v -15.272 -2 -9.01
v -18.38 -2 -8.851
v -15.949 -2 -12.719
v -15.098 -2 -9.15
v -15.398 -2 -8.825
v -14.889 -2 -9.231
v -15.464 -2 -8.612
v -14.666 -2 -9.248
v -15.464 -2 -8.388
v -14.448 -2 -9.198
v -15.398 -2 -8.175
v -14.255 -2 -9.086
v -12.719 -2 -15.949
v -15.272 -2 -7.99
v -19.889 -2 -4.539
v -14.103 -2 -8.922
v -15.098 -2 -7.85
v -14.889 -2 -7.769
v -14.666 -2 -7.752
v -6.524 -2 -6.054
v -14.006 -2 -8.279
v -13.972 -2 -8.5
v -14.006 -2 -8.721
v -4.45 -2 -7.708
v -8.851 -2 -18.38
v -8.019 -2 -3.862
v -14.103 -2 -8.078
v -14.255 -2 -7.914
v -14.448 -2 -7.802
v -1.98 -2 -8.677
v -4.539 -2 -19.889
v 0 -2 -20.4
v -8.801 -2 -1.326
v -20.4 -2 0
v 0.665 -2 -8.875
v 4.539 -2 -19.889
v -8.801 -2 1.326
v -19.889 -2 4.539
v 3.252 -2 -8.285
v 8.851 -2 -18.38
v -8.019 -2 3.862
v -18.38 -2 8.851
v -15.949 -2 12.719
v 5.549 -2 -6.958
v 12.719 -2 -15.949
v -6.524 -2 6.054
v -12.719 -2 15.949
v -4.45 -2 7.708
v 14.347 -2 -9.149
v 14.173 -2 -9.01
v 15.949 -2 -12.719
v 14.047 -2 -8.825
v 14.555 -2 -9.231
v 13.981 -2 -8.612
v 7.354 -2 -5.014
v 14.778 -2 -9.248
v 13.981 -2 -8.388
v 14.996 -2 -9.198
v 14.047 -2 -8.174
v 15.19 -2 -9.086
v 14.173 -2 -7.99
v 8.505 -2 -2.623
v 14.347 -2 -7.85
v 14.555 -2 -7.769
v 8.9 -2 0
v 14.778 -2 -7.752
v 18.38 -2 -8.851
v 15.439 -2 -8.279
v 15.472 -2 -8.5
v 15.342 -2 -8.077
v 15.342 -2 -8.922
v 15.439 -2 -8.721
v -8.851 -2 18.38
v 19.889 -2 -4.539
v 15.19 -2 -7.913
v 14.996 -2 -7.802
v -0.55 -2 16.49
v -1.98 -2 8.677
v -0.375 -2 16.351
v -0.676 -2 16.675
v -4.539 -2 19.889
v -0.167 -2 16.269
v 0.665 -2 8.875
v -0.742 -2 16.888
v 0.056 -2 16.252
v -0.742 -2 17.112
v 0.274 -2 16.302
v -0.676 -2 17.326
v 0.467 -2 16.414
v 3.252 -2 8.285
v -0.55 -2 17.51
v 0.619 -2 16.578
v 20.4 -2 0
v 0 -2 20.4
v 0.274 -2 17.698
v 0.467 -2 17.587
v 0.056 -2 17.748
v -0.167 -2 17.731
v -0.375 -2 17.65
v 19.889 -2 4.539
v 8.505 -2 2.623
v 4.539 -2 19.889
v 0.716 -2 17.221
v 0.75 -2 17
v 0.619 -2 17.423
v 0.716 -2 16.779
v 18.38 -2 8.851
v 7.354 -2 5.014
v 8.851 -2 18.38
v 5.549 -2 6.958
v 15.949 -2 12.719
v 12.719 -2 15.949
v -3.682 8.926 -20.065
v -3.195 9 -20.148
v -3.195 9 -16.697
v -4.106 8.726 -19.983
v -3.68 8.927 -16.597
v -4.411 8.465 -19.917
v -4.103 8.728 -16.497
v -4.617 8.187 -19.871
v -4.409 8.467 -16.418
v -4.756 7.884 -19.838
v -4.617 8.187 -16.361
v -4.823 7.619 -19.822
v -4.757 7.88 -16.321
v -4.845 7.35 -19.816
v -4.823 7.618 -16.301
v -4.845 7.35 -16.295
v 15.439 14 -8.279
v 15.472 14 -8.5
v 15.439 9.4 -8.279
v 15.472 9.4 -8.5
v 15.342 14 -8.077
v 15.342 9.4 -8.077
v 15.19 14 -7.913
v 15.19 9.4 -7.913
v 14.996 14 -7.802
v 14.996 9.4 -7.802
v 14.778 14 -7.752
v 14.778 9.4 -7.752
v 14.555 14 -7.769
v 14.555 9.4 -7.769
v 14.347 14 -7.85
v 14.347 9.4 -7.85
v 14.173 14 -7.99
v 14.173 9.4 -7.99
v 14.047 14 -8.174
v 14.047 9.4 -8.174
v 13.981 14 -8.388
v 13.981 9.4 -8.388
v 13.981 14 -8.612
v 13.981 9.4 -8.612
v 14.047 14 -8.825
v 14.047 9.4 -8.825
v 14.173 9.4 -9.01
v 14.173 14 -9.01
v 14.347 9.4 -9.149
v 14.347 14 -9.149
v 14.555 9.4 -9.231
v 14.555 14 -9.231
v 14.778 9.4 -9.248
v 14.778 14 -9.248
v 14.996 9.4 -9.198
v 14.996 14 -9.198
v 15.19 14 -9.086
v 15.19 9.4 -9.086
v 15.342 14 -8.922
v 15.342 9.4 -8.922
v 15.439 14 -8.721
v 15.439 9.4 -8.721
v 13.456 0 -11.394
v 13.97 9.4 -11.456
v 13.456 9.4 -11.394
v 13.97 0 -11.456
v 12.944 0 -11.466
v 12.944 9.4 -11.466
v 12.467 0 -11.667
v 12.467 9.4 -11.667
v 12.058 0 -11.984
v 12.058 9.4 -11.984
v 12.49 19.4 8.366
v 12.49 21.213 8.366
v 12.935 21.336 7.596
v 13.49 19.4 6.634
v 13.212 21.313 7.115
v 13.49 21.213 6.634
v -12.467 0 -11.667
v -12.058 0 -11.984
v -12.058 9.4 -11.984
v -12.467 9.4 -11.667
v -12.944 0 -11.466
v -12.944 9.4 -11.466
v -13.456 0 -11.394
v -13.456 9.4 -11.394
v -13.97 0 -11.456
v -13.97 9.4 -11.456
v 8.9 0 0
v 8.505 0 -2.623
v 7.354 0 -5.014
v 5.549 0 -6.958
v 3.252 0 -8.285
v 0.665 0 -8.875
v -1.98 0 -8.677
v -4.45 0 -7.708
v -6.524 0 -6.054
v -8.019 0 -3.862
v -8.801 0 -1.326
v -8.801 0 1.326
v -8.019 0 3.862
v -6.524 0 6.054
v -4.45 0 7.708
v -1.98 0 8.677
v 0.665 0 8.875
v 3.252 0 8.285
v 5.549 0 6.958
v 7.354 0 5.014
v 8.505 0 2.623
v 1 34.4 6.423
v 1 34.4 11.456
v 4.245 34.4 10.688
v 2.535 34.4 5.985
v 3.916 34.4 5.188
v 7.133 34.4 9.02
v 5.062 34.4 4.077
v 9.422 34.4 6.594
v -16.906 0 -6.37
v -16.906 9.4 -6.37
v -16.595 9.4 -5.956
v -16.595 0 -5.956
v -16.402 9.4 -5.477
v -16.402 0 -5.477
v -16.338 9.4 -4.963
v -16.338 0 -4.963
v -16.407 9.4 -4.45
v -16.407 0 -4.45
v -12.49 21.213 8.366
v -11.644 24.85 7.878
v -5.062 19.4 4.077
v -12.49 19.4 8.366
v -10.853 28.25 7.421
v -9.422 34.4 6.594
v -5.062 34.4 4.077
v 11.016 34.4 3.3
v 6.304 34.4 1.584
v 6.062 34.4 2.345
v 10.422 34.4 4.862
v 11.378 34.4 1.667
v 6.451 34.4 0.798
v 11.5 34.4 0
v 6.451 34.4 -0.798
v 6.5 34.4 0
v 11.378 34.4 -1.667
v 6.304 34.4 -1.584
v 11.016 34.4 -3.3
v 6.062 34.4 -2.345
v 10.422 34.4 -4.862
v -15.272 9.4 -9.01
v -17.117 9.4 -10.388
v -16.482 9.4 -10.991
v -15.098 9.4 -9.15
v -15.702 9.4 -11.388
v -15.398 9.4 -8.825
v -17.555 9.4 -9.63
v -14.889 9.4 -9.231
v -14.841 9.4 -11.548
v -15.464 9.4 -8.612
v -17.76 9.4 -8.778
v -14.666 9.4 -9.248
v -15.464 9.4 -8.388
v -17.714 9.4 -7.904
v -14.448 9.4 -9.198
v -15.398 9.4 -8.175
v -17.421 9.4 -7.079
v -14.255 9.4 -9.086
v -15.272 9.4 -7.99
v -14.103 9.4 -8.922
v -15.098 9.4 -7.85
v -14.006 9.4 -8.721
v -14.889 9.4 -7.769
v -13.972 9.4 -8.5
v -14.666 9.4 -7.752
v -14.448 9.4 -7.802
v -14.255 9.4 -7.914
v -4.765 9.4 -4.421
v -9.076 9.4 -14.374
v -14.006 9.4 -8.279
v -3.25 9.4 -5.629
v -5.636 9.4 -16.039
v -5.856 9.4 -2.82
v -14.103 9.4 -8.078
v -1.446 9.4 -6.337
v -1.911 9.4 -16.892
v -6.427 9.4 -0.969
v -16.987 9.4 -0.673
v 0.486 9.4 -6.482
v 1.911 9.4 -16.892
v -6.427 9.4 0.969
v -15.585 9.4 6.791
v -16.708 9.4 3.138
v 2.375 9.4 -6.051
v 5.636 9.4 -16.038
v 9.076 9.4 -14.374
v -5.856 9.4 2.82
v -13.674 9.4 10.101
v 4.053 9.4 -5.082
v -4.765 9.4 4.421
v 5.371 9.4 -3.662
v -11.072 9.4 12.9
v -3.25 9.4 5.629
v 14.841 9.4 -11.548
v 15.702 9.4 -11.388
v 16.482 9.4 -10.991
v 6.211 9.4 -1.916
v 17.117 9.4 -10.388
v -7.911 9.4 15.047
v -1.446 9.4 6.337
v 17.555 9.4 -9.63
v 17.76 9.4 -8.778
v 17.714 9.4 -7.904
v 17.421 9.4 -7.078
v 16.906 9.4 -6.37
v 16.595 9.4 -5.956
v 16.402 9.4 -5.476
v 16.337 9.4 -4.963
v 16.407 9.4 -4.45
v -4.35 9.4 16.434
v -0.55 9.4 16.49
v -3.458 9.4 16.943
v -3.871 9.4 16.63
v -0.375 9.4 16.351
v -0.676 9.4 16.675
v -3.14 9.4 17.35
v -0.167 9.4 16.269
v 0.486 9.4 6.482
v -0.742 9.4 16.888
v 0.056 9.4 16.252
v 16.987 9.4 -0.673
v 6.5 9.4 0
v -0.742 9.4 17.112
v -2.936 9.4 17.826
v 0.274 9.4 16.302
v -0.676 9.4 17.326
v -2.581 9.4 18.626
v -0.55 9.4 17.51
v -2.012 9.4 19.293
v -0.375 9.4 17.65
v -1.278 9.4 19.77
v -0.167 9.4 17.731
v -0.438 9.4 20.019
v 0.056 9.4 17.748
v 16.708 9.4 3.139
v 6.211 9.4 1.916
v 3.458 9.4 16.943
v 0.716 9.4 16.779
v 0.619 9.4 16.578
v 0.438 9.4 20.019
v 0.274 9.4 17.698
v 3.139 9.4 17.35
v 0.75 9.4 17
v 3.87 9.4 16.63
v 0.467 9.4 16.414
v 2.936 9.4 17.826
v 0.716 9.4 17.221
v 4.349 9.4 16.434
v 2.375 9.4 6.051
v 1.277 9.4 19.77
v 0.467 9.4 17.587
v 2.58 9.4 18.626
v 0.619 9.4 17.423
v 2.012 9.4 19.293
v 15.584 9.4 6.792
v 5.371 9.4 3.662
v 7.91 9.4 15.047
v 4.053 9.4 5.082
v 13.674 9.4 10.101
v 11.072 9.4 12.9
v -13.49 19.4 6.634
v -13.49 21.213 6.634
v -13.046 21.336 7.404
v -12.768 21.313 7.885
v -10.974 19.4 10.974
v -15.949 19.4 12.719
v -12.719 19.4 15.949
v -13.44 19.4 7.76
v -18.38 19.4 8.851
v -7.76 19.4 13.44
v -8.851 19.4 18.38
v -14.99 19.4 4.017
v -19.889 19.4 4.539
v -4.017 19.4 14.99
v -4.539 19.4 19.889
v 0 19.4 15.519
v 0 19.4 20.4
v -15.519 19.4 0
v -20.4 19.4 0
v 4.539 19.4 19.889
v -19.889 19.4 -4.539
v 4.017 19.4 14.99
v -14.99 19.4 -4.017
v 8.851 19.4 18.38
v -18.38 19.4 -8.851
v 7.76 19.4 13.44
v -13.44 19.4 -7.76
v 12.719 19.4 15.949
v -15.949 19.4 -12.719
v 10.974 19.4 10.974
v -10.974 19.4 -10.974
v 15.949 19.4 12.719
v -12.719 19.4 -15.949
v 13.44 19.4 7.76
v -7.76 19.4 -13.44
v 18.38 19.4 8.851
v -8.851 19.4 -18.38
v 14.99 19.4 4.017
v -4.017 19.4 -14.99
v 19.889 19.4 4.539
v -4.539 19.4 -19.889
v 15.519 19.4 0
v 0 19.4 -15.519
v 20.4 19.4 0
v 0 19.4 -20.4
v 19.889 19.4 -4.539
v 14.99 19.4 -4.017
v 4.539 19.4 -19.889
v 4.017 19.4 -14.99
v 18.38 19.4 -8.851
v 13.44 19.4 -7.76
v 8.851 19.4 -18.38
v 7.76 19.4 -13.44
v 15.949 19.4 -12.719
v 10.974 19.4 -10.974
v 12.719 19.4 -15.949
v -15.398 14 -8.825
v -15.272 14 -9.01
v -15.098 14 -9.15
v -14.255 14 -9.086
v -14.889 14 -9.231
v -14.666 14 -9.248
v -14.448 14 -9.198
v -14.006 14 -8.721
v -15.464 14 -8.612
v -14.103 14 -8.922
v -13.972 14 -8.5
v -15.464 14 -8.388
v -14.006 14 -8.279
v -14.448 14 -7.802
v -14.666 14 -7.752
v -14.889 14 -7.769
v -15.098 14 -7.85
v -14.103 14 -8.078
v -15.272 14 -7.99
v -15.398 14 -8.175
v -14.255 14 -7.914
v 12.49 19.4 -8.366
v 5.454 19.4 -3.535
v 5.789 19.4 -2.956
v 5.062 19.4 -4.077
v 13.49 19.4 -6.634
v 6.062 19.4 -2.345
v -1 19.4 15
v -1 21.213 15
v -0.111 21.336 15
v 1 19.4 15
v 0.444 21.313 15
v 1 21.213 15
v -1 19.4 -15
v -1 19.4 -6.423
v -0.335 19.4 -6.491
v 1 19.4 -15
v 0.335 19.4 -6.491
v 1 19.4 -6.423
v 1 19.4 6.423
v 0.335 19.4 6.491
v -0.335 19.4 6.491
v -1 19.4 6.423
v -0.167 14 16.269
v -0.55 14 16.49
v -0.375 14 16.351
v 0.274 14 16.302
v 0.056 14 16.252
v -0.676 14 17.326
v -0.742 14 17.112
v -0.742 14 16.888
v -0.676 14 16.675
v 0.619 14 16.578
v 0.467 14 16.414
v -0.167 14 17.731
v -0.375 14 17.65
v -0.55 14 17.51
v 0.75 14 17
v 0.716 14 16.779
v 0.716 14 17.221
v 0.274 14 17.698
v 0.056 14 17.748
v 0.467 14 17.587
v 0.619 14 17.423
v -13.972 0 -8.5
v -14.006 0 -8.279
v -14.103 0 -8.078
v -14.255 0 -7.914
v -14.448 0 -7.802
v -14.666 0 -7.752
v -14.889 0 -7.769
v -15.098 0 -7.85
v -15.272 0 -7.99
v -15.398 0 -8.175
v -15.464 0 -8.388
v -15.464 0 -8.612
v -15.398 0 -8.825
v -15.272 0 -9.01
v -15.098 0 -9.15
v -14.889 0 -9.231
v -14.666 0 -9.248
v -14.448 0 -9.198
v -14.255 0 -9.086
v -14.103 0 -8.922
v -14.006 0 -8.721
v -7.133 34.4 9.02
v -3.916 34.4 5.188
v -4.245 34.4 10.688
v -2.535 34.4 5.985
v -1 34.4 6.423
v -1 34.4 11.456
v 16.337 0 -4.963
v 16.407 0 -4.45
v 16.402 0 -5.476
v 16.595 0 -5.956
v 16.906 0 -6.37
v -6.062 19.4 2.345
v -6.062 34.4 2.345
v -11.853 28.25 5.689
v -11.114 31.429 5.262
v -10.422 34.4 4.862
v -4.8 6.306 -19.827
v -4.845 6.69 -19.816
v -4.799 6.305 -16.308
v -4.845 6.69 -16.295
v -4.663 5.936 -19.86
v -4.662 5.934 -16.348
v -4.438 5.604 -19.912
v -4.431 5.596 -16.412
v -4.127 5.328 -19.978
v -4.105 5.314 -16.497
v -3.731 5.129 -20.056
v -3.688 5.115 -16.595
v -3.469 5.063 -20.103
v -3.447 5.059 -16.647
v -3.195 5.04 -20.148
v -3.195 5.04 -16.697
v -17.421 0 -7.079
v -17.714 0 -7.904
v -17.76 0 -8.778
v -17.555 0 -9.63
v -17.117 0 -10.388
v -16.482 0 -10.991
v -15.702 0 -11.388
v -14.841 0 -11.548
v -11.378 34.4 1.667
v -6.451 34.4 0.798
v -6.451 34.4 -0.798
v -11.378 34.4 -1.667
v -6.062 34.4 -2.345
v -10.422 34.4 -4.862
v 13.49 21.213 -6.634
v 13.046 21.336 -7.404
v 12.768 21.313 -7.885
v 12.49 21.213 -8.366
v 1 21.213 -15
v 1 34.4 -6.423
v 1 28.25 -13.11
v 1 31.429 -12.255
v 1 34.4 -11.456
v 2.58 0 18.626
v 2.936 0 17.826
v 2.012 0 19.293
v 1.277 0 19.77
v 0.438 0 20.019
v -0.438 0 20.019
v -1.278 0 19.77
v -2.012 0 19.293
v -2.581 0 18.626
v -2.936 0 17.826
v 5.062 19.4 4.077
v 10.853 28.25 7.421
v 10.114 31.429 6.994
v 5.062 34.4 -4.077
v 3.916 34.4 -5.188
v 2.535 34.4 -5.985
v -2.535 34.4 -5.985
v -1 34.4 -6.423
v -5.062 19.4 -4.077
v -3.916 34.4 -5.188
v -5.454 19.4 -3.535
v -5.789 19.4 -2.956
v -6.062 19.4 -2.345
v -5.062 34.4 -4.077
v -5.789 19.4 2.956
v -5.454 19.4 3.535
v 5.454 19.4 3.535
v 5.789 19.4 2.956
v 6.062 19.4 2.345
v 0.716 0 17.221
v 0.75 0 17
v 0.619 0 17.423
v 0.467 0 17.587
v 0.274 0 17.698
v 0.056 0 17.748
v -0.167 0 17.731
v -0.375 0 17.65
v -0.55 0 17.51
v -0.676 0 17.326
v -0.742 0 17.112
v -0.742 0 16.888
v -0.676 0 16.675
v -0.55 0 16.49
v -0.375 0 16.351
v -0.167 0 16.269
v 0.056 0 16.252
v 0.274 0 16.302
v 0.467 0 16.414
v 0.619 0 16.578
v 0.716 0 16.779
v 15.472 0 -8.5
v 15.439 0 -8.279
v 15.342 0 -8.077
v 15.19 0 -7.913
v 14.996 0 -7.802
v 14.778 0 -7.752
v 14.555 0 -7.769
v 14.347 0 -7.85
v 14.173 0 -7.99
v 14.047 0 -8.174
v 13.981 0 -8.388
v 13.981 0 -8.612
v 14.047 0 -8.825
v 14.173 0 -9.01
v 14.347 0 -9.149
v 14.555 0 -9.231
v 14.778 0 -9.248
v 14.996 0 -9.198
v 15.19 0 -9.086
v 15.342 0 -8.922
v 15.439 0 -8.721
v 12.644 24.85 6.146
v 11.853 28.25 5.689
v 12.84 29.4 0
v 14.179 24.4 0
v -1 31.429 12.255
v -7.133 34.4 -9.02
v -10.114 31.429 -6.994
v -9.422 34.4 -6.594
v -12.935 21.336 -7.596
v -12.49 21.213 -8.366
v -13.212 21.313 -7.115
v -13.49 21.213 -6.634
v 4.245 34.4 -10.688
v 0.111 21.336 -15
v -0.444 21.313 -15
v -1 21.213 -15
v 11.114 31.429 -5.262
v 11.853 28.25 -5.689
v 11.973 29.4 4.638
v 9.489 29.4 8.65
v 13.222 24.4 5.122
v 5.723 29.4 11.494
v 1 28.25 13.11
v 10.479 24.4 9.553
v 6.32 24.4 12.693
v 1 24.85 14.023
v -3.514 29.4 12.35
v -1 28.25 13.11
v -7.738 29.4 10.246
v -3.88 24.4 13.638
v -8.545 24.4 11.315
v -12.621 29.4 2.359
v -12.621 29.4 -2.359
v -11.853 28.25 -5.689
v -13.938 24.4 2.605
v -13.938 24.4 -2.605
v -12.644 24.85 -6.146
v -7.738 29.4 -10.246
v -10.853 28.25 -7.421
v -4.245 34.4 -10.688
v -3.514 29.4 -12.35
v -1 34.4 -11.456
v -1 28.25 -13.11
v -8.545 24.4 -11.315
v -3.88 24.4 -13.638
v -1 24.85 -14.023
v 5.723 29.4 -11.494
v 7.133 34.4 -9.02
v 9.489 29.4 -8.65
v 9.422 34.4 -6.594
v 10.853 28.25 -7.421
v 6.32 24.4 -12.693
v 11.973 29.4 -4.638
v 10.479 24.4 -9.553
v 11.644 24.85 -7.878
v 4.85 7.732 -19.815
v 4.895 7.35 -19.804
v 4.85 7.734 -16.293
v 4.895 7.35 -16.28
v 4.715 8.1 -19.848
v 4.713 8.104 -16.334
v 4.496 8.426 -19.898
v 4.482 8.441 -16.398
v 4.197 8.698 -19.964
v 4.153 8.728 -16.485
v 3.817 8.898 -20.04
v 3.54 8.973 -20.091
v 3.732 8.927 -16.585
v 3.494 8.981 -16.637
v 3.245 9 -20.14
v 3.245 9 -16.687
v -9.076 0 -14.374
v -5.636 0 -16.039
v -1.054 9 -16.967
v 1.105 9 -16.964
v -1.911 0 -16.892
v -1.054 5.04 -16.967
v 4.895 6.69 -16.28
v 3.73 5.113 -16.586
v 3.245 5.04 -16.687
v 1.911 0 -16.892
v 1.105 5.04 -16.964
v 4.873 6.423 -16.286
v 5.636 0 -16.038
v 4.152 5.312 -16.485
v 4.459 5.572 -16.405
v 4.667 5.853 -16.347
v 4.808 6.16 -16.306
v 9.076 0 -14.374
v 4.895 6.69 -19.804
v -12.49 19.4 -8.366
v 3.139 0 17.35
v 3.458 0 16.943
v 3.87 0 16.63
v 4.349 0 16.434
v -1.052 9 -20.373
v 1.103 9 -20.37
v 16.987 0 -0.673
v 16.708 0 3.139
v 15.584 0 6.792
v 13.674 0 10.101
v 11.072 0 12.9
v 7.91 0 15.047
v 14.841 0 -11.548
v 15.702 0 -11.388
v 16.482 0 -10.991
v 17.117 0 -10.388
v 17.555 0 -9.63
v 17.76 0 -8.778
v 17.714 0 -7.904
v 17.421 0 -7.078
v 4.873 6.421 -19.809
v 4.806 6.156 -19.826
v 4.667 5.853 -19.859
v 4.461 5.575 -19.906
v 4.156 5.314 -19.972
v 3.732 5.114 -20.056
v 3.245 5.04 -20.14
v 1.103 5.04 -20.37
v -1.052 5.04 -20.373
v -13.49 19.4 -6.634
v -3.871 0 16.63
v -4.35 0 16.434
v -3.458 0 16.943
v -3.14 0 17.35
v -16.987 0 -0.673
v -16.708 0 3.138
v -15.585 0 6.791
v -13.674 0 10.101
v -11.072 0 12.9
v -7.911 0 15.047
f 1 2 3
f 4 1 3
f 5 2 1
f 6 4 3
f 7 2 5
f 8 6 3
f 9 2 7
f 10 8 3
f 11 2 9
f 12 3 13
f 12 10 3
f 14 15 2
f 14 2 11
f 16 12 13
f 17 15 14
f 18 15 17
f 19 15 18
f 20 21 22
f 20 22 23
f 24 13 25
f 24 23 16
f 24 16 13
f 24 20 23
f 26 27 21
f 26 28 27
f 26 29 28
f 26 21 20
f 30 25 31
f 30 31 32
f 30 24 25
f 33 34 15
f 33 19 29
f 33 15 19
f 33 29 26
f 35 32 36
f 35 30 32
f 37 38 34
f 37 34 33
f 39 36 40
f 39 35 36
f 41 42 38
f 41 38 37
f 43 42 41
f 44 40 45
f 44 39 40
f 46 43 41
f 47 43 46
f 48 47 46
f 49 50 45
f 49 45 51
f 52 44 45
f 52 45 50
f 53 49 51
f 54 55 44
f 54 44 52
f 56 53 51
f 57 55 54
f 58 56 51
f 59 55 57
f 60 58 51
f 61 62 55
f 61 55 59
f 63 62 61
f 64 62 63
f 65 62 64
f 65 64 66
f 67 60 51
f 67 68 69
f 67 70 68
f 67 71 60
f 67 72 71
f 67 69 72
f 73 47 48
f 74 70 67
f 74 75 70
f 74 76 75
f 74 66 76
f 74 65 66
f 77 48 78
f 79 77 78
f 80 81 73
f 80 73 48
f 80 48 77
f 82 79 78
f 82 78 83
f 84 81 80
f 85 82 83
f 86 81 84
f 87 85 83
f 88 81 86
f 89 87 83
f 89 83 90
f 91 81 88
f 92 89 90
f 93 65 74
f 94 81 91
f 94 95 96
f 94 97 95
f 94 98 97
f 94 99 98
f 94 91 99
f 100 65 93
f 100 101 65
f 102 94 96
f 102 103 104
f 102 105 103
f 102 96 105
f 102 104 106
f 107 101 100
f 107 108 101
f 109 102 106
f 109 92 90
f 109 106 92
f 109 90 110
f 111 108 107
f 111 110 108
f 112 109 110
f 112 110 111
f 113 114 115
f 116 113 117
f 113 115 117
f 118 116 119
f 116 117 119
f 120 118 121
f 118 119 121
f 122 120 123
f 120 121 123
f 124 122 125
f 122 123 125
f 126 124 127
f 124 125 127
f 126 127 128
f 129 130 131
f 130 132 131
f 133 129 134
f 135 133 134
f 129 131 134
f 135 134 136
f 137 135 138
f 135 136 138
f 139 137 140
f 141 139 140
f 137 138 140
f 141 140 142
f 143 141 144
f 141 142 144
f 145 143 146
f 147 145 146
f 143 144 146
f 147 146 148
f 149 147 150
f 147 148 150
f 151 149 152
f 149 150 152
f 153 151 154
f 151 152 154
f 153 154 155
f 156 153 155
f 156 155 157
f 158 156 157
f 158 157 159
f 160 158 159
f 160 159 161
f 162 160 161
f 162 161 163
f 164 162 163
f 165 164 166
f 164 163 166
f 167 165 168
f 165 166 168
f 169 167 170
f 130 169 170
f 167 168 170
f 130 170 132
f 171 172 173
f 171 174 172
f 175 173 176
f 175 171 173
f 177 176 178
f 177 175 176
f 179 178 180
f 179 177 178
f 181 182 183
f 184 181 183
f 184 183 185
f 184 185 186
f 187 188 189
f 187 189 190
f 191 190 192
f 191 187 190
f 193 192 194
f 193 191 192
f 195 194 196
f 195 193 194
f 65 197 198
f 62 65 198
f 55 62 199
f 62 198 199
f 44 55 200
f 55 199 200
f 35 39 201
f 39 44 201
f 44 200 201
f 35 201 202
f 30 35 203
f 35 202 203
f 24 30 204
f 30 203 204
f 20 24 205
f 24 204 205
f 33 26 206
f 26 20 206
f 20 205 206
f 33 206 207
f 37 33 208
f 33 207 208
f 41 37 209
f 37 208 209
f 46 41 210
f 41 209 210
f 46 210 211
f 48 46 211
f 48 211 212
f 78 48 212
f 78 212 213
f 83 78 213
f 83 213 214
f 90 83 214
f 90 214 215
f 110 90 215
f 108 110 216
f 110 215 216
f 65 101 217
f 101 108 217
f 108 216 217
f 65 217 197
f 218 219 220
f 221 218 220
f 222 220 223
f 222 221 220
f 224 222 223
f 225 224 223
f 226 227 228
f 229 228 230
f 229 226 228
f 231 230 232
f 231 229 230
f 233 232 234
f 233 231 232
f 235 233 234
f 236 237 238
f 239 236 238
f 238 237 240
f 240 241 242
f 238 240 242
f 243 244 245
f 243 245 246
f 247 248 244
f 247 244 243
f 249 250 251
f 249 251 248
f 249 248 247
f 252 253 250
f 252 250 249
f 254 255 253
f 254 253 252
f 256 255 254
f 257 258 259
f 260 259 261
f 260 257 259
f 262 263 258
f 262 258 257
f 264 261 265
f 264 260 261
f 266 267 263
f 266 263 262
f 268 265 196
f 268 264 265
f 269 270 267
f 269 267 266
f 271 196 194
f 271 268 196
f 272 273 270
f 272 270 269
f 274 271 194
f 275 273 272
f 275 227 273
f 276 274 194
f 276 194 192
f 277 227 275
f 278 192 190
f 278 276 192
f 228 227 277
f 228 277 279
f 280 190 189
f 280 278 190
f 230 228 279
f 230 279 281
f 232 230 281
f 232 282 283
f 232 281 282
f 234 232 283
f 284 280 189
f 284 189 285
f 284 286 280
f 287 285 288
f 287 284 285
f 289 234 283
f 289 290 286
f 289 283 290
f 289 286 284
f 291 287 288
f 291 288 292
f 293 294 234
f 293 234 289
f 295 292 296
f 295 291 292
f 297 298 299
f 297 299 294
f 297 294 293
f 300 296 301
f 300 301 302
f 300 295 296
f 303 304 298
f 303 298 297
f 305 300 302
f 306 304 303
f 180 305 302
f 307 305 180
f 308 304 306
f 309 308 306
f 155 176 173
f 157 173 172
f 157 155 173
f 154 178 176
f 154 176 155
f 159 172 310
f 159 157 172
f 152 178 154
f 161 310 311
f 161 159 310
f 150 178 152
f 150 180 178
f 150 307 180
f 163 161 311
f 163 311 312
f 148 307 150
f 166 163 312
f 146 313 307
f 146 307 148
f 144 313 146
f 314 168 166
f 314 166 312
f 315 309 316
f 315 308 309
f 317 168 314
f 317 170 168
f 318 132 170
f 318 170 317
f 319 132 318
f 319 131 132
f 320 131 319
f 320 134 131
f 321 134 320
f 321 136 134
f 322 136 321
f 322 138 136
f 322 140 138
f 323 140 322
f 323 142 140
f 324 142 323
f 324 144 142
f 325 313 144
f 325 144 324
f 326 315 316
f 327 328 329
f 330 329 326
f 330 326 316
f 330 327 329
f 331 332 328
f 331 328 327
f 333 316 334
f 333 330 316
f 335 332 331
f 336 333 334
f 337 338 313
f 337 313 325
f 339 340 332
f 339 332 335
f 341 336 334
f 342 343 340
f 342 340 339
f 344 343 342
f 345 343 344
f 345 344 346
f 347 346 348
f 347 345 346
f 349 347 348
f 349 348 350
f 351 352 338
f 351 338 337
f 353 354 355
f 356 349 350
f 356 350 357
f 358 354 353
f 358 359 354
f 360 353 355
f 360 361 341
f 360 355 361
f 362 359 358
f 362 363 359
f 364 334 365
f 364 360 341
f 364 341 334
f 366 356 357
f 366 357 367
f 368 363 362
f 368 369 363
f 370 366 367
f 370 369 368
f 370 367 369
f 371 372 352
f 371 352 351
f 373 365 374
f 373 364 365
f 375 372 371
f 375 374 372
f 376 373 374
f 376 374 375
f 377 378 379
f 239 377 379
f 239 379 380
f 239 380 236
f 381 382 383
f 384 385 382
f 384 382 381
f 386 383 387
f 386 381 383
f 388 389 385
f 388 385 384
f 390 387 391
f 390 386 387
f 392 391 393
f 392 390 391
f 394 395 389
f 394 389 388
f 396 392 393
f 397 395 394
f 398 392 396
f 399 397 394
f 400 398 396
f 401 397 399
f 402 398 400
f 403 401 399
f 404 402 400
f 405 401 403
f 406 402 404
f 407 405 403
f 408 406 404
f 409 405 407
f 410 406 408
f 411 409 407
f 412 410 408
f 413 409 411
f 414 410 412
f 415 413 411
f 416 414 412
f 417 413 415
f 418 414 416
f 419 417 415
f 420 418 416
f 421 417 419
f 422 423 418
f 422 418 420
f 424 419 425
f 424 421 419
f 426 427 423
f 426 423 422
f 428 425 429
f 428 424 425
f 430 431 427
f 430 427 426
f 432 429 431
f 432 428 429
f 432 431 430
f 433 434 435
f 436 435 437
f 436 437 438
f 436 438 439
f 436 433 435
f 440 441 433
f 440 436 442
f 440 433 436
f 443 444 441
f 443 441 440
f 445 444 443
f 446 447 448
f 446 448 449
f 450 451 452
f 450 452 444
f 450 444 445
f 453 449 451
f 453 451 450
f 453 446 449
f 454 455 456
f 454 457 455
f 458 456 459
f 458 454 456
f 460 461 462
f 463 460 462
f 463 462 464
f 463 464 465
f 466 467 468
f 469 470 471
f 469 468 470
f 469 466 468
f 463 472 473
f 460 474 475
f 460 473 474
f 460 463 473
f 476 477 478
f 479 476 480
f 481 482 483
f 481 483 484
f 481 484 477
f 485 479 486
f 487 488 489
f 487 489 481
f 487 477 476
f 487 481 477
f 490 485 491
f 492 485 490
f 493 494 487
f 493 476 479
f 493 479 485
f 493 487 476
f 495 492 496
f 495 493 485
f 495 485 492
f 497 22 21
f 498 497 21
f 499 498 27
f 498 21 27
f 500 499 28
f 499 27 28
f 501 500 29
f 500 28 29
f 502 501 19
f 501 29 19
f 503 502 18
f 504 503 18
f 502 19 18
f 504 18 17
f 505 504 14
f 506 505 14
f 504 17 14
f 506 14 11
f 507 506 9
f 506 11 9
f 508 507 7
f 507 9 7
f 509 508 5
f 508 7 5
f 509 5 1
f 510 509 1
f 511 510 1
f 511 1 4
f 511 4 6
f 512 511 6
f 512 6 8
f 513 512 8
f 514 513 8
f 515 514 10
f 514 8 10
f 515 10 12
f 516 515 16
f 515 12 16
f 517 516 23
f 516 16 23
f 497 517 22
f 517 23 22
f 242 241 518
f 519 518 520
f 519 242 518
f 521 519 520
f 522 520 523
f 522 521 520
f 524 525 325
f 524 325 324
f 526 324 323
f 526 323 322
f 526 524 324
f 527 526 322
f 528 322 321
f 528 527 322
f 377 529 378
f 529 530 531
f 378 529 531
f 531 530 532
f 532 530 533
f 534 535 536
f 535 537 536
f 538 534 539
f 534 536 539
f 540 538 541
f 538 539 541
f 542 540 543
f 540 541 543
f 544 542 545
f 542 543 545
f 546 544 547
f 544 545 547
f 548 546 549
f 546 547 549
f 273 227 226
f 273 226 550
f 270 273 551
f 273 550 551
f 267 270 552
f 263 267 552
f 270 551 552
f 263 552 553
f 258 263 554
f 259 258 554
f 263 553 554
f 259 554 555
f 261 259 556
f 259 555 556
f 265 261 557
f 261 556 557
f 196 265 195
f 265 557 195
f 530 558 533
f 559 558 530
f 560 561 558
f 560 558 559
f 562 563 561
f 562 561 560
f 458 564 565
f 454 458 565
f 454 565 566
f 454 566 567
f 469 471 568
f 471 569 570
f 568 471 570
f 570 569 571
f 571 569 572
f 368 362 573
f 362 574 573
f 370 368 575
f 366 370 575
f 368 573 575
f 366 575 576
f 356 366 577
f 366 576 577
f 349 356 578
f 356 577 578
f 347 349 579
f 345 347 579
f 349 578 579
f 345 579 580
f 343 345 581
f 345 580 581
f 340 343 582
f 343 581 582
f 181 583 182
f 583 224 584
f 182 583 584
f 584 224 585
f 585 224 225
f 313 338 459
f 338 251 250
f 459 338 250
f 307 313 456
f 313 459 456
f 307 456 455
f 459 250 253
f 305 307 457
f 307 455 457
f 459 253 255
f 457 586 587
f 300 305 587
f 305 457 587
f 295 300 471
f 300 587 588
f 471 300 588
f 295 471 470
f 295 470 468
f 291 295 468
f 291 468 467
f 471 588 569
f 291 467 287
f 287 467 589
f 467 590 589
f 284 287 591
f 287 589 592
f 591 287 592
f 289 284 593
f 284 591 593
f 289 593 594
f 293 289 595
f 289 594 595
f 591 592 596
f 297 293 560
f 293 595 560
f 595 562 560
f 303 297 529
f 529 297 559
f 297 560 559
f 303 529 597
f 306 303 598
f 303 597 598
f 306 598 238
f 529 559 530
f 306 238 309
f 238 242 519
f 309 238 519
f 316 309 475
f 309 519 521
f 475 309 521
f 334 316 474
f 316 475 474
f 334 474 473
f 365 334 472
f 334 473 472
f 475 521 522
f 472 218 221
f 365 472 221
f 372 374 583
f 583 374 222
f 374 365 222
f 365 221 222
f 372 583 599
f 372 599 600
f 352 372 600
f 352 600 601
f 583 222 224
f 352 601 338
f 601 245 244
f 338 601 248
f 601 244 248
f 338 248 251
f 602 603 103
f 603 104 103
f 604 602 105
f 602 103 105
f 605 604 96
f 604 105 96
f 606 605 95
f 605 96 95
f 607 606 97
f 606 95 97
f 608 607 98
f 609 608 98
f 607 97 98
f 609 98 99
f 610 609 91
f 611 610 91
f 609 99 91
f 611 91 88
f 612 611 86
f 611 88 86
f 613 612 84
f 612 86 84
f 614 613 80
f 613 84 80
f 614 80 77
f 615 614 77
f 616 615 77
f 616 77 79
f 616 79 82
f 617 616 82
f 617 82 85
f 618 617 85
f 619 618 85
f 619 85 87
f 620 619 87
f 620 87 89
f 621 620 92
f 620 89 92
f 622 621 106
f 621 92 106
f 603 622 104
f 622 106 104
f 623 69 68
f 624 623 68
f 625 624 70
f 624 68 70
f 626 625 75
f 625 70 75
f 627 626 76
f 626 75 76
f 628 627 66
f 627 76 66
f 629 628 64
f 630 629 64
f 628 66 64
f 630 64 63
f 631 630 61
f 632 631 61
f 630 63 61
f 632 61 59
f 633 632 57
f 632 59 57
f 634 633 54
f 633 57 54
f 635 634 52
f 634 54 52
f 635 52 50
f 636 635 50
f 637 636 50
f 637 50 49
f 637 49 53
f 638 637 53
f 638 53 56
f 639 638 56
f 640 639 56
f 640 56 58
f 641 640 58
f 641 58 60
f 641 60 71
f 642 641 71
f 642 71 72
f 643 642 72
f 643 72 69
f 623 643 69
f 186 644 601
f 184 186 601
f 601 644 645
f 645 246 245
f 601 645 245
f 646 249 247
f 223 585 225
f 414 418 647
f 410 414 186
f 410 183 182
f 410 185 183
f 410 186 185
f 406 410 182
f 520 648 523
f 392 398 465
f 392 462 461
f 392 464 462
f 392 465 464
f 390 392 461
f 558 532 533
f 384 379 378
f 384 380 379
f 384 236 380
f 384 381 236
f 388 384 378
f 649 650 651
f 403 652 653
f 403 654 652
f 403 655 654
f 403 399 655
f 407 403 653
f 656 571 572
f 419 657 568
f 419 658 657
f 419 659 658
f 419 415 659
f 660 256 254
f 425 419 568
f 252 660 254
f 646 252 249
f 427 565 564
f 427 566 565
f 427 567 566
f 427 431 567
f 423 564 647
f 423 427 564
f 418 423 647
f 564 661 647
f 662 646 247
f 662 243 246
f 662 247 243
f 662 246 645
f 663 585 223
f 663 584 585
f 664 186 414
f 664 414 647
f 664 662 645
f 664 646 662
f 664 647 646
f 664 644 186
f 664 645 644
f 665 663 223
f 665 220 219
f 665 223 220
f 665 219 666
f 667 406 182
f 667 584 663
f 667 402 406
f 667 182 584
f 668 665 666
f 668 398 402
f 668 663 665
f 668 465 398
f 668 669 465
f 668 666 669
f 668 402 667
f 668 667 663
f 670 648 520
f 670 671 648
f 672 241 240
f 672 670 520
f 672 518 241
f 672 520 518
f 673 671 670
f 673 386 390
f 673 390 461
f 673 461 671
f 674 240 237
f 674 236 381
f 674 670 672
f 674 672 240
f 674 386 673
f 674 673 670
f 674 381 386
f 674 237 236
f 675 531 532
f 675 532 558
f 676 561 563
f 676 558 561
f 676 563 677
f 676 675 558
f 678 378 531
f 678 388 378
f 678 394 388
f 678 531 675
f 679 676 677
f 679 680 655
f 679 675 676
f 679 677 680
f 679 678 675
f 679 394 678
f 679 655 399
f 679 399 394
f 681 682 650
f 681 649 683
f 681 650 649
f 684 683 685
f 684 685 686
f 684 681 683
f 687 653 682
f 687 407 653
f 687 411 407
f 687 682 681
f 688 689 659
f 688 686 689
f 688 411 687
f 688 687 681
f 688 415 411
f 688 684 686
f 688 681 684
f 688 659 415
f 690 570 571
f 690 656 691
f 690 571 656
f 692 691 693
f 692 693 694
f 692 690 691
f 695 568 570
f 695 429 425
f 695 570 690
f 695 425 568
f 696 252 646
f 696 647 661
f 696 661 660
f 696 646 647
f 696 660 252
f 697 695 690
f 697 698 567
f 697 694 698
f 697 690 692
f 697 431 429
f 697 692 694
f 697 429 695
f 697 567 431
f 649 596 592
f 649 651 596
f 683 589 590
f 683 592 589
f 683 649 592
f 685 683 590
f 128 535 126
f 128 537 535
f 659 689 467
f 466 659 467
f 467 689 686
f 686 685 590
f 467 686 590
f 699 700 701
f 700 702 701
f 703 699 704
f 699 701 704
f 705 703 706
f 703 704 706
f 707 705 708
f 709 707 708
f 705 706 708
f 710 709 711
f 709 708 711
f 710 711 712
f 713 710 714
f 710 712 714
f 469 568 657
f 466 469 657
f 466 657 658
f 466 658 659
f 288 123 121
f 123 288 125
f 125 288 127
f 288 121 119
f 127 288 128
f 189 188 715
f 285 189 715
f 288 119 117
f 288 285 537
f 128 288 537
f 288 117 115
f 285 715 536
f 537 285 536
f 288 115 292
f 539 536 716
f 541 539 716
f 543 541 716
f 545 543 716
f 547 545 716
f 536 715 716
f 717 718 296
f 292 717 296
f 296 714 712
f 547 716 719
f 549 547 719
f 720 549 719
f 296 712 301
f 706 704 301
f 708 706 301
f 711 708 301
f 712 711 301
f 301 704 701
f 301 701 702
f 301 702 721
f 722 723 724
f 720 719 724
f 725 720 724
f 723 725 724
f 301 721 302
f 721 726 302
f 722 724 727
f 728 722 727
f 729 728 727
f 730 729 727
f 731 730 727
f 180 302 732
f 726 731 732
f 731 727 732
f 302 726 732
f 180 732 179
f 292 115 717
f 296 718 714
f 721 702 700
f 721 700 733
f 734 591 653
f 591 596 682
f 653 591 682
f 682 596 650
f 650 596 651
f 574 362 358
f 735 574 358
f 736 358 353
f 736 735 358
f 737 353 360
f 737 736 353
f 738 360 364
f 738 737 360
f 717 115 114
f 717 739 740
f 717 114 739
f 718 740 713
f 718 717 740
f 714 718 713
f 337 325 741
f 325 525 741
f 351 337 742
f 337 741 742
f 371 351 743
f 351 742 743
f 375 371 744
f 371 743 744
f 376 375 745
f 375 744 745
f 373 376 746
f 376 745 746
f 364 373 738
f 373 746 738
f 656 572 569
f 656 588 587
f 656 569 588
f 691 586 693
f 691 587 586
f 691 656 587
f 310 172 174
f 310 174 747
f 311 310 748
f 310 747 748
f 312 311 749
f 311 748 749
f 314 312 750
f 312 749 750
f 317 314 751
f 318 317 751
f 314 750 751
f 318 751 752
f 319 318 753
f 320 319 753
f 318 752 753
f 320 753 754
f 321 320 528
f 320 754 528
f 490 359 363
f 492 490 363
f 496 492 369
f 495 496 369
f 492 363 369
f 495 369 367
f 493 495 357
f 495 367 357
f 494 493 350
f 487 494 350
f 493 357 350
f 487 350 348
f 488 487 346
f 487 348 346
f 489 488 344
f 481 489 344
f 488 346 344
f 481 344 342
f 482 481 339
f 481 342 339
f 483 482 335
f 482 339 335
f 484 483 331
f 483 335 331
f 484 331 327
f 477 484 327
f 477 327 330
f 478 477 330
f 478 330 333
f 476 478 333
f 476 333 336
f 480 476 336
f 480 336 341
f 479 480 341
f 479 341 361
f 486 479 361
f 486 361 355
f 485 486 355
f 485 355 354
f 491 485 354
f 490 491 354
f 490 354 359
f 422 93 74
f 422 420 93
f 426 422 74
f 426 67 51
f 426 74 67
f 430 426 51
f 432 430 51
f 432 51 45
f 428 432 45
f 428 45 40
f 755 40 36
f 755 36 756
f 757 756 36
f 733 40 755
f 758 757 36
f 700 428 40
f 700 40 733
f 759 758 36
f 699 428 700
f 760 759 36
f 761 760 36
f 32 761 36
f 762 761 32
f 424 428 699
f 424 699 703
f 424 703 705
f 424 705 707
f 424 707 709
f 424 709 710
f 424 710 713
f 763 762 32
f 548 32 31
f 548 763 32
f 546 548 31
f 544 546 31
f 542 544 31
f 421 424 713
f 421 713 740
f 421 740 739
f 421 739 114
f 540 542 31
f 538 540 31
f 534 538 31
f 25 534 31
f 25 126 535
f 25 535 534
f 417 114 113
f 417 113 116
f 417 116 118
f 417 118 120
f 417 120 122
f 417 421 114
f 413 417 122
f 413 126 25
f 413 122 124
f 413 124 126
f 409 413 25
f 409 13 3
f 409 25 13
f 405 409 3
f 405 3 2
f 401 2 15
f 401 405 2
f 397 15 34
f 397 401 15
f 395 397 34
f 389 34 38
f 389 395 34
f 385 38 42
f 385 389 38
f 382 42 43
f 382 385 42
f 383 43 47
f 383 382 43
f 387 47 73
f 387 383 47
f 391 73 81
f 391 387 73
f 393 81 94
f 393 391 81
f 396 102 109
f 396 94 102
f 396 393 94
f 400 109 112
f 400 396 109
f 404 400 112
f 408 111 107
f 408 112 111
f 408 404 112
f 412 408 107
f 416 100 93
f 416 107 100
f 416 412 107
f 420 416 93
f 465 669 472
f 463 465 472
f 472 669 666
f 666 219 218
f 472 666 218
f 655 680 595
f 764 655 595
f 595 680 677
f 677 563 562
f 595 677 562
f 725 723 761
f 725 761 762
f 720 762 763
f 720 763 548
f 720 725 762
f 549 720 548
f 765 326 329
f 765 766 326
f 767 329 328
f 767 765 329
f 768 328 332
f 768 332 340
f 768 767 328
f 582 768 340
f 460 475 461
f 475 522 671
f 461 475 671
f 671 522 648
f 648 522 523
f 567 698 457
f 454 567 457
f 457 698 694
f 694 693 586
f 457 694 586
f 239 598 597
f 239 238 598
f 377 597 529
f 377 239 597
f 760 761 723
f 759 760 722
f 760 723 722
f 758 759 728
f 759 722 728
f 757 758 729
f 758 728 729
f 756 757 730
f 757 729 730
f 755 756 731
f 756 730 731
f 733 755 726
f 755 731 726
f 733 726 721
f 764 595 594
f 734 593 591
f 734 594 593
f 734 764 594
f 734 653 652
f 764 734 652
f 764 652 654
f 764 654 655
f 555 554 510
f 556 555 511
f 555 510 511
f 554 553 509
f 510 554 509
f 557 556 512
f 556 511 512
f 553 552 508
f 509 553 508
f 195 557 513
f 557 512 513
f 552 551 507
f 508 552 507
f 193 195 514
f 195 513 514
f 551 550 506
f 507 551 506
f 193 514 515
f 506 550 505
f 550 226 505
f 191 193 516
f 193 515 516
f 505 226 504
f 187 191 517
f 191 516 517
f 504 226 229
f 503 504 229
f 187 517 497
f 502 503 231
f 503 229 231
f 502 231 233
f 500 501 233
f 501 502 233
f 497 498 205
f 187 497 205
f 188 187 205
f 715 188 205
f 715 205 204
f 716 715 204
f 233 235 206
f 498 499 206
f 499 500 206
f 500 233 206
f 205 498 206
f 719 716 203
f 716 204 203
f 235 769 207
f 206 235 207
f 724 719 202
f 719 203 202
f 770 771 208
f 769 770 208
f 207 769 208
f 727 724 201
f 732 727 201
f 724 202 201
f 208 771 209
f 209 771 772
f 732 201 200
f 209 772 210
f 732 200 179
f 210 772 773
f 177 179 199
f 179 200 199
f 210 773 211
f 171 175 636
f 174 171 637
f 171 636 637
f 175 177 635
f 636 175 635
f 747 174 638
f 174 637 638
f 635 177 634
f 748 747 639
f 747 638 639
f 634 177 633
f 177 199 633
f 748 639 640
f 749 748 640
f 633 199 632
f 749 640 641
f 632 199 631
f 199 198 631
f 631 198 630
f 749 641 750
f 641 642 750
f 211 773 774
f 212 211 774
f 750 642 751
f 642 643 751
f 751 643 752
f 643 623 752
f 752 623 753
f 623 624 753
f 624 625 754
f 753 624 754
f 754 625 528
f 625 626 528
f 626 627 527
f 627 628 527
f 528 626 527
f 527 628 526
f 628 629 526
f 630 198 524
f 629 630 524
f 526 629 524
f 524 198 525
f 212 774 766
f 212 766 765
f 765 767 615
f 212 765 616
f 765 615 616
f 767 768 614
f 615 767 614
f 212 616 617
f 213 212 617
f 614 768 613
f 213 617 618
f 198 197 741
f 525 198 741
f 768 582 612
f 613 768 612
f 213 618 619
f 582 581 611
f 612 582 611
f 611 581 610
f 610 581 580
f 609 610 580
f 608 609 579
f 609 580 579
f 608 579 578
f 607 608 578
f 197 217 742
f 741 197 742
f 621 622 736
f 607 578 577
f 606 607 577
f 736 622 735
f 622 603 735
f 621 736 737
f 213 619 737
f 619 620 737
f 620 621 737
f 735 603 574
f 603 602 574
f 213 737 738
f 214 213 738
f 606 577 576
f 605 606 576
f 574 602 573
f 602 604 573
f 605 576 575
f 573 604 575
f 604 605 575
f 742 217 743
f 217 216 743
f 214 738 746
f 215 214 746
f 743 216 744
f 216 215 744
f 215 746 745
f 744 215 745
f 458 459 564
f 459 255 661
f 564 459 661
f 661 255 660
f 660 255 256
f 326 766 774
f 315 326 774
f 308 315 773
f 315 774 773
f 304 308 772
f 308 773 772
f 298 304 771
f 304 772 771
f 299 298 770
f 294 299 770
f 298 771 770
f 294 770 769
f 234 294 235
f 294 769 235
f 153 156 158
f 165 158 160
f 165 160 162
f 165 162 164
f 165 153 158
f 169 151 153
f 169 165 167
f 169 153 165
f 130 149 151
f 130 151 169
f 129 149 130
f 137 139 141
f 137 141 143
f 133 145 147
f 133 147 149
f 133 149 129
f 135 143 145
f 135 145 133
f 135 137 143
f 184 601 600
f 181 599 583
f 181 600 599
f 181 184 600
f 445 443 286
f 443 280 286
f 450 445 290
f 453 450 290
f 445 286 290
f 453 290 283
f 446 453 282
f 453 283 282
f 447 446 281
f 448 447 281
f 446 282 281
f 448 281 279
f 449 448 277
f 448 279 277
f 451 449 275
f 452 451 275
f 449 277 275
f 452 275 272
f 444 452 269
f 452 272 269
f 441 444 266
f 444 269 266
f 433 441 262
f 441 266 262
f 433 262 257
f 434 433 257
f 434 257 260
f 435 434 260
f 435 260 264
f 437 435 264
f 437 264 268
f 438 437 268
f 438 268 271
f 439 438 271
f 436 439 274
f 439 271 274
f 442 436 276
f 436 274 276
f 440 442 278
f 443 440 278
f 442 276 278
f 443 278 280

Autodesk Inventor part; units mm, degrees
ref_plane "YZ Plane" through (0, 0, 0) normal (1, 0, 0) x (0, 1, 0)
ref_plane "XZ Plane" through (0, 0, 0) normal (0, 1, 0) x (-1, 0, 0)
ref_plane "XY Plane" through (0, 0, 0) normal (0, 0, 1) x (1, 0, 0)
sketch "Эскиз1" plane through (0, 0, 0) normal (0, 0, 1) x (1, 0, 0)
  line L0 (17, 0) -> (17, 0)
  line L1 (6.5, 12) -> (6.5, 19.4)
  line L2 (6.5, 19.4) -> (20.4, 19.4)
  line L3 (20.4, 19.4) -> (20.4, 0)
  line L4 (0, 0) -> (0, 10)
  line L5 (17, 0) -> (17, 0)
  line L6 (6.5, 19.4) -> (6.5, 34.4)
  line L7 (6.5, 34.4) -> (11.5, 34.4)
  line L8 (11.5, 34.4) -> (15.5192, 19.4)
  line L9 (6.5, 12) -> (6.5, 0)
  line L10 (6.5, 0) -> (20.4, 0)
  point P0 (6.5, 10)
  dimension "d2" = 10
  dimension "d18" = 13
  dimension "d20" = 5
  dimension "d21" = 75
  dimension "d22" = 15
  dimension "d30" = 40.8
  dimension "d31" = 19.4
revolve "Вращение1" add sketch "Эскиз1" angle 360 about axis through (0, 0, 0) along (0, 1, 0)
sketch "Эскиз3" plane through (0, 34.4, 0) normal (0, 1, 0) x (1, 0, 0)
  line L0 (-1, 0) -> (1, 0)
  line L1 (1, 0) -> (1, 15)
  line L2 (1, 15) -> (-1, 15)
  line L3 (-1, 15) -> (-1, 0)
  point P0 (0, 0)
  point P1 (0, 0)
  dimension "d23" = 2
  dimension "d24" = 15
extrude "Выдавливание2" cut sketch "Эскиз3" against normal up to surface (15 mm away)
pattern_circular "Круговой массив2" count 6 over 360 about axis through (0, -10, 0) along (0, 1, 0) of "Выдавливание2"
sketch "Эскиз4" plane through (0, 0, 0) normal (0, -1, 0) x (1, 0, 0)
  arc A0 (-4.3498, 16.4342) -> (-16.4073, -4.4503) centre (-0.0001, 0.0001) ccw projected
  arc A1 (16.4071, -4.45) -> (4.3493, 16.4343) centre (-0.0001, 0.0001) ccw projected
  arc A2 (2.9358, 17.8261) -> (4.3493, 16.4343) centre (4.8611, 18.3678) ccw projected
  arc A3 (2.9358, 17.8261) -> (-2.9363, 17.826) centre (-0.0003, 17.0002) ccw projected
  arc A4 (-4.3498, 16.4342) -> (-2.9363, 17.826) centre (-4.8616, 18.3676) ccw projected
  arc A5 (-16.9058, -6.3704) -> (-16.4073, -4.4503) centre (-18.3375, -4.9739) ccw projected
  arc A6 (-16.9058, -6.3704) -> (-13.9698, -11.4557) centre (-14.7225, -8.5) ccw projected
  arc A7 (-12.0576, -11.9839) -> (-13.9698, -11.4557) centre (-13.4762, -13.394) ccw projected
  arc A8 (-12.0576, -11.9839) -> (12.0576, -11.9837) centre (-0.0001, 0.0001) ccw projected
  arc A9 (13.9697, -11.4555) -> (12.0576, -11.9837) centre (13.4761, -13.3936) ccw projected
  arc A10 (13.9697, -11.4555) -> (16.9057, -6.3701) centre (14.7223, -8.4998) ccw projected
  arc A11 (16.4071, -4.45) -> (16.9057, -6.3701) centre (18.3373, -4.9736) ccw projected
extrude "Выдавливание3" cut sketch "Эскиз4" against normal blind 9.4
sketch "Эскиз5" plane through (0, 0, 0) normal (0, -1, 0) x (1, 0, 0)
  circle A0 centre (0, 0) radius 8.5 projected
  circle A1 centre (0, 0) radius 20.4 projected
  circle A2 centre (0, 0) radius 8.9
  dimension "d34" = 17.8
extrude "Выдавливание4" add sketch "Эскиз5" along normal blind 2 contours A1
sketch "Эскиз6" plane through (0, 0, 0) normal (0, 0, 1) x (1, 0, 0)
  arc A0 (-4.445, 6.69) -> (-3.195, 5.44) centre (-3.195, 6.69) ccw projected
  line L0 (-4.445, 6.69) -> (-4.445, 7.35) projected
  arc A1 (-3.195, 8.6) -> (-4.445, 7.35) centre (-3.195, 7.35) ccw projected
  line L1 (-0.2632, 8.6) -> (-3.195, 8.6) projected
  line L2 (3.245, 8.6) -> (-0.2432, 8.6) projected
  arc A2 (4.495, 7.35) -> (3.245, 8.6) centre (3.245, 7.35) ccw projected
  line L3 (4.495, 6.69) -> (4.495, 7.35) projected
  arc A3 (3.245, 5.44) -> (4.495, 6.69) centre (3.245, 6.69) ccw projected
  line L4 (-0.0106, 8.6) -> (-0.2632, 8.6) projected
  line L5 (-3.195, 5.44) -> (3.245, 5.44) projected
  line L6 (-0.2432, 9) -> (3.245, 9)
  arc A4 (4.895, 7.35) -> (3.245, 9) centre (3.245, 7.35) ccw
  line L7 (4.895, 7.35) -> (4.895, 6.69)
  arc A5 (3.245, 5.04) -> (4.895, 6.69) centre (3.245, 6.69) ccw
  line L8 (3.245, 5.04) -> (-3.195, 5.04)
  arc A6 (-4.845, 6.69) -> (-3.195, 5.04) centre (-3.195, 6.69) ccw
  line L9 (-4.845, 6.69) -> (-4.845, 7.35)
  arc A7 (-3.195, 9) -> (-4.845, 7.35) centre (-3.195, 7.35) ccw
  line L10 (-3.195, 9) -> (-0.2632, 9)
  line L11 (-0.2432, 9) -> (-0.2632, 9)
  point P0 (0, 0)
  dimension "d37" = 1.65
  dimension "d38" = 90
  dimension "d39" = 1.65
  dimension "d42" = 4.7582
extrude "Выдавливание5" cut sketch "Эскиз6" against normal through all contours L0 A1 L1 L4 L2 A2 L3 A3 L5 A0 | L6 A4 L7 A5 L8 A6 L9 A7 L10 L11
sketch "Эскиз7" plane through (0, -2, 0) normal (0, -1, 0) x (1, 0, 0)
  arc A0 (-10.8652, -13.0746) -> (10.8651, -13.0746) centre (0, 0.0001) ccw construction
  circle A1 centre (-0.0003, 17.0002) radius 1.05 projected
  circle A2 centre (14.7223, -8.4998) radius 1.05 projected
  circle A3 centre (-14.7225, -8.5) radius 1.05 projected
  circle A4 centre (-0.0003, 17.0002) radius 0.75
  circle A5 centre (14.7223, -8.4998) radius 0.75
  circle A6 centre (-14.7225, -8.5) radius 0.75
  dimension "d57" = 1.5
  dimension "d58" = 1.5
  dimension "d59" = 1.5
extrude "Выдавливание6" cut sketch "Эскиз7" against normal blind 16 contours A4 | A5 | A6
properties part number "Цанга_держатель"
